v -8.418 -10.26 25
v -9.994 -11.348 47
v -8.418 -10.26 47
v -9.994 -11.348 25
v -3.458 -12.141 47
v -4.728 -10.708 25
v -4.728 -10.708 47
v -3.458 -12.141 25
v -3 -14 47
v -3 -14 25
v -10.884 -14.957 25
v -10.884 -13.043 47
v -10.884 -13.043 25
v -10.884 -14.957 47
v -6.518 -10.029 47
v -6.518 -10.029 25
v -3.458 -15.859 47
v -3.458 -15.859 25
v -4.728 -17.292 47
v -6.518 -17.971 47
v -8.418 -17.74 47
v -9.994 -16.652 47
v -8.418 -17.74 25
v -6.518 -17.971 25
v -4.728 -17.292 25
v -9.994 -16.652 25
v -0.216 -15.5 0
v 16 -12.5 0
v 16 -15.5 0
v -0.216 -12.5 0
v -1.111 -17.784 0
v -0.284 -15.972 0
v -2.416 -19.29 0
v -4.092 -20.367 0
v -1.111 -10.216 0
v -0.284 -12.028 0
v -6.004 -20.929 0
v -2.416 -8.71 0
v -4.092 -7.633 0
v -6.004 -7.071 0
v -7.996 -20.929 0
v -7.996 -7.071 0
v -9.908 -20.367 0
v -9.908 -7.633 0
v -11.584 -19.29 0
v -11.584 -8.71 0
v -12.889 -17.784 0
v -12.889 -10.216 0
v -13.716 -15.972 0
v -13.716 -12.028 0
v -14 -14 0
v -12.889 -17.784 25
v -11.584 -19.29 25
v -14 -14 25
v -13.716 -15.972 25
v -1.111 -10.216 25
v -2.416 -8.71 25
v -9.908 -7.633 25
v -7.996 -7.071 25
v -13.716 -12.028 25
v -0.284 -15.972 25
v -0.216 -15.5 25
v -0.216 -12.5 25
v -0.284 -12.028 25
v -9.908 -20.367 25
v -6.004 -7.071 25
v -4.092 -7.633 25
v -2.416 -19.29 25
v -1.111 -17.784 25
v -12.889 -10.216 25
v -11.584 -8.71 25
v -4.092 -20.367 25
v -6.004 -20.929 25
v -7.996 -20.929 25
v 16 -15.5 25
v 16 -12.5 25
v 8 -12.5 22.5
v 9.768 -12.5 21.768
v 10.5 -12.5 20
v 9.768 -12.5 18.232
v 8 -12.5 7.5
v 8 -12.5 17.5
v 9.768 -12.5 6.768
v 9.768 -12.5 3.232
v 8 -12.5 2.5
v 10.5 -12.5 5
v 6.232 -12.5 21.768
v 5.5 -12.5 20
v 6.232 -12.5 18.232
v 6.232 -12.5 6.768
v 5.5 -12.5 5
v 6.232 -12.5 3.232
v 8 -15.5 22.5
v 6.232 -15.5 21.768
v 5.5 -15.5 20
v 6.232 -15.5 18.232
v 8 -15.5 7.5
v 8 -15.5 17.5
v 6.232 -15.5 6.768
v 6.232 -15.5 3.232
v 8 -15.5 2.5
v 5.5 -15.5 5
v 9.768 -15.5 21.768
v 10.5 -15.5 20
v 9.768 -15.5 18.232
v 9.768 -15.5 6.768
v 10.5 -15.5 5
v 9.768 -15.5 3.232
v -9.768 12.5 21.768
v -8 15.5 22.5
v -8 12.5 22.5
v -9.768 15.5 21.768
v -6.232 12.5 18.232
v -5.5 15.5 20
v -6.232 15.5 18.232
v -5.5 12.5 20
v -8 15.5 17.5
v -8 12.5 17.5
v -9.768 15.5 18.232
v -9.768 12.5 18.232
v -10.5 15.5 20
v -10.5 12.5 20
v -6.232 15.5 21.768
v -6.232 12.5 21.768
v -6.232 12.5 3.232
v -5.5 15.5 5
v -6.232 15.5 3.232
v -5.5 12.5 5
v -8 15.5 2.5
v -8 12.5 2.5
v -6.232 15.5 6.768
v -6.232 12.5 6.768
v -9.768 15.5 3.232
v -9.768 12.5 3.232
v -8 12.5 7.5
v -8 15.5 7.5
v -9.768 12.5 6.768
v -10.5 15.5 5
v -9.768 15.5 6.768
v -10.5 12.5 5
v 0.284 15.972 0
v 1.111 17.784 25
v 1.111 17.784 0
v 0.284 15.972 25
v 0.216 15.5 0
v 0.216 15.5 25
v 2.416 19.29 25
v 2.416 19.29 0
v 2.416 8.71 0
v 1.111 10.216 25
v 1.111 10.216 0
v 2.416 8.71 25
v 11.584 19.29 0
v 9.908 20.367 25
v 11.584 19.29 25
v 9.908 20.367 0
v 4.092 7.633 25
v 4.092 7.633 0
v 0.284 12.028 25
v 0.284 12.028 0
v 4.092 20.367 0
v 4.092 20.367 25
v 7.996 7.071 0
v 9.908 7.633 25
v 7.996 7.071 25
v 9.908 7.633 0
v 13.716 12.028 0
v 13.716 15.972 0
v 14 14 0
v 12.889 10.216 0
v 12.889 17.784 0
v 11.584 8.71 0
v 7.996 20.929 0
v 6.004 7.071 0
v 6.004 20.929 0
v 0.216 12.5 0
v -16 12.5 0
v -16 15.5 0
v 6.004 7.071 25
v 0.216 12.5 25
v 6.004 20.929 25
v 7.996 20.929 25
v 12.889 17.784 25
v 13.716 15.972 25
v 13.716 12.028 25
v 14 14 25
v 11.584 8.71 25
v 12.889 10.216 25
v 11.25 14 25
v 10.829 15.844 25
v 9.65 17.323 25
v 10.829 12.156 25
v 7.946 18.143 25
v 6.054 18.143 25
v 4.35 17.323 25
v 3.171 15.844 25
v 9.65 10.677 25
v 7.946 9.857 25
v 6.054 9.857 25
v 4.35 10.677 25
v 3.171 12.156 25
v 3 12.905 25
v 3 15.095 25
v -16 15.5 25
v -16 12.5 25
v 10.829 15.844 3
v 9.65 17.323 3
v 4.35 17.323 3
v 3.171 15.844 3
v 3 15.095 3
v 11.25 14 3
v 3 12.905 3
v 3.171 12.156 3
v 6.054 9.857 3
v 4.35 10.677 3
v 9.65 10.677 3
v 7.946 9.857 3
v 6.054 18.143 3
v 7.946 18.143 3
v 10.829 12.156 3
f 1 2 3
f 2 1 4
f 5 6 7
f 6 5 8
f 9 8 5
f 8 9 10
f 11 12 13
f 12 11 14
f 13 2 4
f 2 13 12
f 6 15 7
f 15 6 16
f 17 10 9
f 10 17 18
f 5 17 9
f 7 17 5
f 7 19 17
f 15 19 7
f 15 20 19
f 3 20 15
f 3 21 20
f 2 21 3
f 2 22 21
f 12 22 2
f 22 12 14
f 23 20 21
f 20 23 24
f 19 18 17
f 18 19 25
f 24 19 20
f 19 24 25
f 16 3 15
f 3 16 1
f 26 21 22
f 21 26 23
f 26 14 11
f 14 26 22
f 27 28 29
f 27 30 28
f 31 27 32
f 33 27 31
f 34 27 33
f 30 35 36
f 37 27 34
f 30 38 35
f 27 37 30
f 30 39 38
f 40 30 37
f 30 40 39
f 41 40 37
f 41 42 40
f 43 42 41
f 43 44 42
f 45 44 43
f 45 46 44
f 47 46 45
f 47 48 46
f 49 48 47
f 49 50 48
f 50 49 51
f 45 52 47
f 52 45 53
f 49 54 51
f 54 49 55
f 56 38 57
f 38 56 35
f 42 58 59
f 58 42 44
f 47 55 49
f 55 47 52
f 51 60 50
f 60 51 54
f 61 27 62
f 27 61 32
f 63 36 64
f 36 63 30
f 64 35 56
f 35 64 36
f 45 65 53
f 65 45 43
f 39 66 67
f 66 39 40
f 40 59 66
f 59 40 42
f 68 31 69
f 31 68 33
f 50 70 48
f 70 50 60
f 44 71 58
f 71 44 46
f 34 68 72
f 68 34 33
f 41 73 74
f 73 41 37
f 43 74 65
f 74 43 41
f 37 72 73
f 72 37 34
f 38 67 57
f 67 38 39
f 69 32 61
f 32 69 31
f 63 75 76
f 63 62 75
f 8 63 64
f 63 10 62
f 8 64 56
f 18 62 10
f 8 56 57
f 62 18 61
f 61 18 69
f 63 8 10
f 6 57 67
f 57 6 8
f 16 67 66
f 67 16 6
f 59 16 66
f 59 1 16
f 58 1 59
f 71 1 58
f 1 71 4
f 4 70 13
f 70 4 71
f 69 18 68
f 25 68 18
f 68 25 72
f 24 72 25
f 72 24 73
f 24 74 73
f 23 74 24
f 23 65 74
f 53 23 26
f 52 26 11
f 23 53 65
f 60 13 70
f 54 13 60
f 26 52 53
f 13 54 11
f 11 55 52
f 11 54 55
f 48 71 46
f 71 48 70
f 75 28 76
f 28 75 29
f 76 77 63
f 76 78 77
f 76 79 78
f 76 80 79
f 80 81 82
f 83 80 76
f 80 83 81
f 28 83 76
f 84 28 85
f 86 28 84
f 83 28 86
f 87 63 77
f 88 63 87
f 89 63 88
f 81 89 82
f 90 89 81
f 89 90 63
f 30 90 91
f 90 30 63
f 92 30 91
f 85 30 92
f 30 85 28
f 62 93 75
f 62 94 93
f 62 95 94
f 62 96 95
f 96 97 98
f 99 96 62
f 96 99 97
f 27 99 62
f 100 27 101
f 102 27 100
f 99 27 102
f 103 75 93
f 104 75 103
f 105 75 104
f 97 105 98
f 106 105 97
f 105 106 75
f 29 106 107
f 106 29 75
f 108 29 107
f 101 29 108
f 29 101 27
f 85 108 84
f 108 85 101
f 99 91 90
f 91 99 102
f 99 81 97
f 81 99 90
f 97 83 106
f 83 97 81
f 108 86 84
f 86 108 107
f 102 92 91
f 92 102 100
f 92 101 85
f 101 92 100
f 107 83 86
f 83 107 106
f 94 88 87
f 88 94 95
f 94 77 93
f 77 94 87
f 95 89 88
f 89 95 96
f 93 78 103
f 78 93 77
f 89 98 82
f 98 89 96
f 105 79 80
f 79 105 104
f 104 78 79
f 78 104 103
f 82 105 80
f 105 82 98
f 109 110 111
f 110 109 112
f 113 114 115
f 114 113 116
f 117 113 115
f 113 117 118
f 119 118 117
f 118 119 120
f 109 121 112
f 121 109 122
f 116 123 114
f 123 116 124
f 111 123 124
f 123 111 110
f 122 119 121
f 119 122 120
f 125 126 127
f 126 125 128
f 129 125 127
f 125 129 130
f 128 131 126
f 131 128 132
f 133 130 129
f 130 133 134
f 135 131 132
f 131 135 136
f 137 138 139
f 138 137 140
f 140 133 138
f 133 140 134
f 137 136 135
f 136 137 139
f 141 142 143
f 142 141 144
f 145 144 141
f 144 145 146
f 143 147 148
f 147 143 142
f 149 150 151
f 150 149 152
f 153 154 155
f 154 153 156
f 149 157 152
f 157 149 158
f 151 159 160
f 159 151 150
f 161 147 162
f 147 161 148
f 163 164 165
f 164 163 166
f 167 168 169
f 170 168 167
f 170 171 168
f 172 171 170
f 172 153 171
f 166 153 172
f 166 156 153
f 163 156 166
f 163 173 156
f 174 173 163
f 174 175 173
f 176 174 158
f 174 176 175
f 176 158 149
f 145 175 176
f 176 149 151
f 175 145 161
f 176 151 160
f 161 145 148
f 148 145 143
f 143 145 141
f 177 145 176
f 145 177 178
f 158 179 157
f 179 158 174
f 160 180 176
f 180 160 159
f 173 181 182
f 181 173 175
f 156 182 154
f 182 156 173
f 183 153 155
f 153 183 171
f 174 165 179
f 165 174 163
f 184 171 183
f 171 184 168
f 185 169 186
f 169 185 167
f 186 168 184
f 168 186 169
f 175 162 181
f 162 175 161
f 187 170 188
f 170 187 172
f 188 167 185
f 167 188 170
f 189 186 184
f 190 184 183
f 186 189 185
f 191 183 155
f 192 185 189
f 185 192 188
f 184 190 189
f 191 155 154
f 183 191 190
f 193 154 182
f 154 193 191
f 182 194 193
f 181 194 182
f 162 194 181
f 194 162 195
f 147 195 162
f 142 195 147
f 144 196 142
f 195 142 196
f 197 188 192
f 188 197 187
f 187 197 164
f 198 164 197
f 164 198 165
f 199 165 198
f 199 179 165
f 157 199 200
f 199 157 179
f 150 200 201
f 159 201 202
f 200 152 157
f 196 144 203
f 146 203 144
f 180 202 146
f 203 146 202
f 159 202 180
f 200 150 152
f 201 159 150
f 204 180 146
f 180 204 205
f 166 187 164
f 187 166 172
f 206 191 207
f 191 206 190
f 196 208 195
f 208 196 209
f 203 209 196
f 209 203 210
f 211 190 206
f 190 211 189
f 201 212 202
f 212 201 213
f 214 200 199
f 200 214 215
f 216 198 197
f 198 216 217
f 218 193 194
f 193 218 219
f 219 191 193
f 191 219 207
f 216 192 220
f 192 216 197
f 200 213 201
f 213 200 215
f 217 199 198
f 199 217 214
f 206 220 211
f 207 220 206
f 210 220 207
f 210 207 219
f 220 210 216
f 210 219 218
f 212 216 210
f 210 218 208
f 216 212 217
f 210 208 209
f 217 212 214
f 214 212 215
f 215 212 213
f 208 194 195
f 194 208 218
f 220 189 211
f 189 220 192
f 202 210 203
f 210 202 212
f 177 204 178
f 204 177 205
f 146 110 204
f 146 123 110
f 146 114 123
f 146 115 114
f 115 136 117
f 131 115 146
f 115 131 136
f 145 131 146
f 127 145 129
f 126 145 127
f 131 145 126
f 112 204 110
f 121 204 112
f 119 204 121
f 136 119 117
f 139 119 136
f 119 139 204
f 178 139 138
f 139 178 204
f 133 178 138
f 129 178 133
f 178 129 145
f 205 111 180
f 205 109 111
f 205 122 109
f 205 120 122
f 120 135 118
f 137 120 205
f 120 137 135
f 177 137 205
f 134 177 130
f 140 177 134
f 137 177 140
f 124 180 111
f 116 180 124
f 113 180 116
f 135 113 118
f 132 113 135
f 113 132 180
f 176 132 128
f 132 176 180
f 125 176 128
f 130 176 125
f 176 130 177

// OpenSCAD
innerDiameter=8;
outerDiameter=14;
play=0.5;
length=50;
hingeWidth=16;
hingeThickness=3;
boreDiameter=5;

translate([0,-outerDiameter,0]){
rotate(-90,[0,1,0]){
difference(){
union(){
translate([0,-hingeThickness/2,-hingeWidth]){
cube([length/2,hingeThickness,hingeWidth+outerDiameter/2]);
}
translate([0,0,outerDiameter/2]){
rotate(90,[0,1,0]){
union(){
    cylinder(h=length-(outerDiameter-innerDiameter)/2, d=innerDiameter);
    cylinder(h=length/2, d=outerDiameter);
}
}
}
}
translate([boreDiameter,hingeThickness/2+1,-hingeWidth/2]){
rotate(90,[1,0,0]){
cylinder(hingeThickness+2,d=boreDiameter);
translate([length/2-2*boreDiameter,0,0]){
    cylinder(hingeThickness+2,d=boreDiameter);
}
}
}
}
}
}


translate([0,outerDiameter,length/2]){
rotate(90,[0,1,0]){
difference(){
union(){
translate([0,-hingeThickness/2,-hingeWidth]){
cube([length/2,hingeThickness,hingeWidth+(outerDiameter-innerDiameter)/2]);
}
translate([0,0,outerDiameter/2]){
rotate(90,[0,1,0]){
difference(){
cylinder(h=length/2,d=outerDiameter);
cylinder(h=length/2-(outerDiameter-innerDiameter)/2, d=innerDiameter+play);
}
}
}
}
translate([boreDiameter,hingeThickness/2+1,-hingeWidth/2]){
rotate(90,[1,0,0]){
cylinder(hingeThickness+2,d=boreDiameter);
translate([length/2-2*boreDiameter,0,0]){
    cylinder(hingeThickness+2,d=boreDiameter);
}
}
}
}
}
}
